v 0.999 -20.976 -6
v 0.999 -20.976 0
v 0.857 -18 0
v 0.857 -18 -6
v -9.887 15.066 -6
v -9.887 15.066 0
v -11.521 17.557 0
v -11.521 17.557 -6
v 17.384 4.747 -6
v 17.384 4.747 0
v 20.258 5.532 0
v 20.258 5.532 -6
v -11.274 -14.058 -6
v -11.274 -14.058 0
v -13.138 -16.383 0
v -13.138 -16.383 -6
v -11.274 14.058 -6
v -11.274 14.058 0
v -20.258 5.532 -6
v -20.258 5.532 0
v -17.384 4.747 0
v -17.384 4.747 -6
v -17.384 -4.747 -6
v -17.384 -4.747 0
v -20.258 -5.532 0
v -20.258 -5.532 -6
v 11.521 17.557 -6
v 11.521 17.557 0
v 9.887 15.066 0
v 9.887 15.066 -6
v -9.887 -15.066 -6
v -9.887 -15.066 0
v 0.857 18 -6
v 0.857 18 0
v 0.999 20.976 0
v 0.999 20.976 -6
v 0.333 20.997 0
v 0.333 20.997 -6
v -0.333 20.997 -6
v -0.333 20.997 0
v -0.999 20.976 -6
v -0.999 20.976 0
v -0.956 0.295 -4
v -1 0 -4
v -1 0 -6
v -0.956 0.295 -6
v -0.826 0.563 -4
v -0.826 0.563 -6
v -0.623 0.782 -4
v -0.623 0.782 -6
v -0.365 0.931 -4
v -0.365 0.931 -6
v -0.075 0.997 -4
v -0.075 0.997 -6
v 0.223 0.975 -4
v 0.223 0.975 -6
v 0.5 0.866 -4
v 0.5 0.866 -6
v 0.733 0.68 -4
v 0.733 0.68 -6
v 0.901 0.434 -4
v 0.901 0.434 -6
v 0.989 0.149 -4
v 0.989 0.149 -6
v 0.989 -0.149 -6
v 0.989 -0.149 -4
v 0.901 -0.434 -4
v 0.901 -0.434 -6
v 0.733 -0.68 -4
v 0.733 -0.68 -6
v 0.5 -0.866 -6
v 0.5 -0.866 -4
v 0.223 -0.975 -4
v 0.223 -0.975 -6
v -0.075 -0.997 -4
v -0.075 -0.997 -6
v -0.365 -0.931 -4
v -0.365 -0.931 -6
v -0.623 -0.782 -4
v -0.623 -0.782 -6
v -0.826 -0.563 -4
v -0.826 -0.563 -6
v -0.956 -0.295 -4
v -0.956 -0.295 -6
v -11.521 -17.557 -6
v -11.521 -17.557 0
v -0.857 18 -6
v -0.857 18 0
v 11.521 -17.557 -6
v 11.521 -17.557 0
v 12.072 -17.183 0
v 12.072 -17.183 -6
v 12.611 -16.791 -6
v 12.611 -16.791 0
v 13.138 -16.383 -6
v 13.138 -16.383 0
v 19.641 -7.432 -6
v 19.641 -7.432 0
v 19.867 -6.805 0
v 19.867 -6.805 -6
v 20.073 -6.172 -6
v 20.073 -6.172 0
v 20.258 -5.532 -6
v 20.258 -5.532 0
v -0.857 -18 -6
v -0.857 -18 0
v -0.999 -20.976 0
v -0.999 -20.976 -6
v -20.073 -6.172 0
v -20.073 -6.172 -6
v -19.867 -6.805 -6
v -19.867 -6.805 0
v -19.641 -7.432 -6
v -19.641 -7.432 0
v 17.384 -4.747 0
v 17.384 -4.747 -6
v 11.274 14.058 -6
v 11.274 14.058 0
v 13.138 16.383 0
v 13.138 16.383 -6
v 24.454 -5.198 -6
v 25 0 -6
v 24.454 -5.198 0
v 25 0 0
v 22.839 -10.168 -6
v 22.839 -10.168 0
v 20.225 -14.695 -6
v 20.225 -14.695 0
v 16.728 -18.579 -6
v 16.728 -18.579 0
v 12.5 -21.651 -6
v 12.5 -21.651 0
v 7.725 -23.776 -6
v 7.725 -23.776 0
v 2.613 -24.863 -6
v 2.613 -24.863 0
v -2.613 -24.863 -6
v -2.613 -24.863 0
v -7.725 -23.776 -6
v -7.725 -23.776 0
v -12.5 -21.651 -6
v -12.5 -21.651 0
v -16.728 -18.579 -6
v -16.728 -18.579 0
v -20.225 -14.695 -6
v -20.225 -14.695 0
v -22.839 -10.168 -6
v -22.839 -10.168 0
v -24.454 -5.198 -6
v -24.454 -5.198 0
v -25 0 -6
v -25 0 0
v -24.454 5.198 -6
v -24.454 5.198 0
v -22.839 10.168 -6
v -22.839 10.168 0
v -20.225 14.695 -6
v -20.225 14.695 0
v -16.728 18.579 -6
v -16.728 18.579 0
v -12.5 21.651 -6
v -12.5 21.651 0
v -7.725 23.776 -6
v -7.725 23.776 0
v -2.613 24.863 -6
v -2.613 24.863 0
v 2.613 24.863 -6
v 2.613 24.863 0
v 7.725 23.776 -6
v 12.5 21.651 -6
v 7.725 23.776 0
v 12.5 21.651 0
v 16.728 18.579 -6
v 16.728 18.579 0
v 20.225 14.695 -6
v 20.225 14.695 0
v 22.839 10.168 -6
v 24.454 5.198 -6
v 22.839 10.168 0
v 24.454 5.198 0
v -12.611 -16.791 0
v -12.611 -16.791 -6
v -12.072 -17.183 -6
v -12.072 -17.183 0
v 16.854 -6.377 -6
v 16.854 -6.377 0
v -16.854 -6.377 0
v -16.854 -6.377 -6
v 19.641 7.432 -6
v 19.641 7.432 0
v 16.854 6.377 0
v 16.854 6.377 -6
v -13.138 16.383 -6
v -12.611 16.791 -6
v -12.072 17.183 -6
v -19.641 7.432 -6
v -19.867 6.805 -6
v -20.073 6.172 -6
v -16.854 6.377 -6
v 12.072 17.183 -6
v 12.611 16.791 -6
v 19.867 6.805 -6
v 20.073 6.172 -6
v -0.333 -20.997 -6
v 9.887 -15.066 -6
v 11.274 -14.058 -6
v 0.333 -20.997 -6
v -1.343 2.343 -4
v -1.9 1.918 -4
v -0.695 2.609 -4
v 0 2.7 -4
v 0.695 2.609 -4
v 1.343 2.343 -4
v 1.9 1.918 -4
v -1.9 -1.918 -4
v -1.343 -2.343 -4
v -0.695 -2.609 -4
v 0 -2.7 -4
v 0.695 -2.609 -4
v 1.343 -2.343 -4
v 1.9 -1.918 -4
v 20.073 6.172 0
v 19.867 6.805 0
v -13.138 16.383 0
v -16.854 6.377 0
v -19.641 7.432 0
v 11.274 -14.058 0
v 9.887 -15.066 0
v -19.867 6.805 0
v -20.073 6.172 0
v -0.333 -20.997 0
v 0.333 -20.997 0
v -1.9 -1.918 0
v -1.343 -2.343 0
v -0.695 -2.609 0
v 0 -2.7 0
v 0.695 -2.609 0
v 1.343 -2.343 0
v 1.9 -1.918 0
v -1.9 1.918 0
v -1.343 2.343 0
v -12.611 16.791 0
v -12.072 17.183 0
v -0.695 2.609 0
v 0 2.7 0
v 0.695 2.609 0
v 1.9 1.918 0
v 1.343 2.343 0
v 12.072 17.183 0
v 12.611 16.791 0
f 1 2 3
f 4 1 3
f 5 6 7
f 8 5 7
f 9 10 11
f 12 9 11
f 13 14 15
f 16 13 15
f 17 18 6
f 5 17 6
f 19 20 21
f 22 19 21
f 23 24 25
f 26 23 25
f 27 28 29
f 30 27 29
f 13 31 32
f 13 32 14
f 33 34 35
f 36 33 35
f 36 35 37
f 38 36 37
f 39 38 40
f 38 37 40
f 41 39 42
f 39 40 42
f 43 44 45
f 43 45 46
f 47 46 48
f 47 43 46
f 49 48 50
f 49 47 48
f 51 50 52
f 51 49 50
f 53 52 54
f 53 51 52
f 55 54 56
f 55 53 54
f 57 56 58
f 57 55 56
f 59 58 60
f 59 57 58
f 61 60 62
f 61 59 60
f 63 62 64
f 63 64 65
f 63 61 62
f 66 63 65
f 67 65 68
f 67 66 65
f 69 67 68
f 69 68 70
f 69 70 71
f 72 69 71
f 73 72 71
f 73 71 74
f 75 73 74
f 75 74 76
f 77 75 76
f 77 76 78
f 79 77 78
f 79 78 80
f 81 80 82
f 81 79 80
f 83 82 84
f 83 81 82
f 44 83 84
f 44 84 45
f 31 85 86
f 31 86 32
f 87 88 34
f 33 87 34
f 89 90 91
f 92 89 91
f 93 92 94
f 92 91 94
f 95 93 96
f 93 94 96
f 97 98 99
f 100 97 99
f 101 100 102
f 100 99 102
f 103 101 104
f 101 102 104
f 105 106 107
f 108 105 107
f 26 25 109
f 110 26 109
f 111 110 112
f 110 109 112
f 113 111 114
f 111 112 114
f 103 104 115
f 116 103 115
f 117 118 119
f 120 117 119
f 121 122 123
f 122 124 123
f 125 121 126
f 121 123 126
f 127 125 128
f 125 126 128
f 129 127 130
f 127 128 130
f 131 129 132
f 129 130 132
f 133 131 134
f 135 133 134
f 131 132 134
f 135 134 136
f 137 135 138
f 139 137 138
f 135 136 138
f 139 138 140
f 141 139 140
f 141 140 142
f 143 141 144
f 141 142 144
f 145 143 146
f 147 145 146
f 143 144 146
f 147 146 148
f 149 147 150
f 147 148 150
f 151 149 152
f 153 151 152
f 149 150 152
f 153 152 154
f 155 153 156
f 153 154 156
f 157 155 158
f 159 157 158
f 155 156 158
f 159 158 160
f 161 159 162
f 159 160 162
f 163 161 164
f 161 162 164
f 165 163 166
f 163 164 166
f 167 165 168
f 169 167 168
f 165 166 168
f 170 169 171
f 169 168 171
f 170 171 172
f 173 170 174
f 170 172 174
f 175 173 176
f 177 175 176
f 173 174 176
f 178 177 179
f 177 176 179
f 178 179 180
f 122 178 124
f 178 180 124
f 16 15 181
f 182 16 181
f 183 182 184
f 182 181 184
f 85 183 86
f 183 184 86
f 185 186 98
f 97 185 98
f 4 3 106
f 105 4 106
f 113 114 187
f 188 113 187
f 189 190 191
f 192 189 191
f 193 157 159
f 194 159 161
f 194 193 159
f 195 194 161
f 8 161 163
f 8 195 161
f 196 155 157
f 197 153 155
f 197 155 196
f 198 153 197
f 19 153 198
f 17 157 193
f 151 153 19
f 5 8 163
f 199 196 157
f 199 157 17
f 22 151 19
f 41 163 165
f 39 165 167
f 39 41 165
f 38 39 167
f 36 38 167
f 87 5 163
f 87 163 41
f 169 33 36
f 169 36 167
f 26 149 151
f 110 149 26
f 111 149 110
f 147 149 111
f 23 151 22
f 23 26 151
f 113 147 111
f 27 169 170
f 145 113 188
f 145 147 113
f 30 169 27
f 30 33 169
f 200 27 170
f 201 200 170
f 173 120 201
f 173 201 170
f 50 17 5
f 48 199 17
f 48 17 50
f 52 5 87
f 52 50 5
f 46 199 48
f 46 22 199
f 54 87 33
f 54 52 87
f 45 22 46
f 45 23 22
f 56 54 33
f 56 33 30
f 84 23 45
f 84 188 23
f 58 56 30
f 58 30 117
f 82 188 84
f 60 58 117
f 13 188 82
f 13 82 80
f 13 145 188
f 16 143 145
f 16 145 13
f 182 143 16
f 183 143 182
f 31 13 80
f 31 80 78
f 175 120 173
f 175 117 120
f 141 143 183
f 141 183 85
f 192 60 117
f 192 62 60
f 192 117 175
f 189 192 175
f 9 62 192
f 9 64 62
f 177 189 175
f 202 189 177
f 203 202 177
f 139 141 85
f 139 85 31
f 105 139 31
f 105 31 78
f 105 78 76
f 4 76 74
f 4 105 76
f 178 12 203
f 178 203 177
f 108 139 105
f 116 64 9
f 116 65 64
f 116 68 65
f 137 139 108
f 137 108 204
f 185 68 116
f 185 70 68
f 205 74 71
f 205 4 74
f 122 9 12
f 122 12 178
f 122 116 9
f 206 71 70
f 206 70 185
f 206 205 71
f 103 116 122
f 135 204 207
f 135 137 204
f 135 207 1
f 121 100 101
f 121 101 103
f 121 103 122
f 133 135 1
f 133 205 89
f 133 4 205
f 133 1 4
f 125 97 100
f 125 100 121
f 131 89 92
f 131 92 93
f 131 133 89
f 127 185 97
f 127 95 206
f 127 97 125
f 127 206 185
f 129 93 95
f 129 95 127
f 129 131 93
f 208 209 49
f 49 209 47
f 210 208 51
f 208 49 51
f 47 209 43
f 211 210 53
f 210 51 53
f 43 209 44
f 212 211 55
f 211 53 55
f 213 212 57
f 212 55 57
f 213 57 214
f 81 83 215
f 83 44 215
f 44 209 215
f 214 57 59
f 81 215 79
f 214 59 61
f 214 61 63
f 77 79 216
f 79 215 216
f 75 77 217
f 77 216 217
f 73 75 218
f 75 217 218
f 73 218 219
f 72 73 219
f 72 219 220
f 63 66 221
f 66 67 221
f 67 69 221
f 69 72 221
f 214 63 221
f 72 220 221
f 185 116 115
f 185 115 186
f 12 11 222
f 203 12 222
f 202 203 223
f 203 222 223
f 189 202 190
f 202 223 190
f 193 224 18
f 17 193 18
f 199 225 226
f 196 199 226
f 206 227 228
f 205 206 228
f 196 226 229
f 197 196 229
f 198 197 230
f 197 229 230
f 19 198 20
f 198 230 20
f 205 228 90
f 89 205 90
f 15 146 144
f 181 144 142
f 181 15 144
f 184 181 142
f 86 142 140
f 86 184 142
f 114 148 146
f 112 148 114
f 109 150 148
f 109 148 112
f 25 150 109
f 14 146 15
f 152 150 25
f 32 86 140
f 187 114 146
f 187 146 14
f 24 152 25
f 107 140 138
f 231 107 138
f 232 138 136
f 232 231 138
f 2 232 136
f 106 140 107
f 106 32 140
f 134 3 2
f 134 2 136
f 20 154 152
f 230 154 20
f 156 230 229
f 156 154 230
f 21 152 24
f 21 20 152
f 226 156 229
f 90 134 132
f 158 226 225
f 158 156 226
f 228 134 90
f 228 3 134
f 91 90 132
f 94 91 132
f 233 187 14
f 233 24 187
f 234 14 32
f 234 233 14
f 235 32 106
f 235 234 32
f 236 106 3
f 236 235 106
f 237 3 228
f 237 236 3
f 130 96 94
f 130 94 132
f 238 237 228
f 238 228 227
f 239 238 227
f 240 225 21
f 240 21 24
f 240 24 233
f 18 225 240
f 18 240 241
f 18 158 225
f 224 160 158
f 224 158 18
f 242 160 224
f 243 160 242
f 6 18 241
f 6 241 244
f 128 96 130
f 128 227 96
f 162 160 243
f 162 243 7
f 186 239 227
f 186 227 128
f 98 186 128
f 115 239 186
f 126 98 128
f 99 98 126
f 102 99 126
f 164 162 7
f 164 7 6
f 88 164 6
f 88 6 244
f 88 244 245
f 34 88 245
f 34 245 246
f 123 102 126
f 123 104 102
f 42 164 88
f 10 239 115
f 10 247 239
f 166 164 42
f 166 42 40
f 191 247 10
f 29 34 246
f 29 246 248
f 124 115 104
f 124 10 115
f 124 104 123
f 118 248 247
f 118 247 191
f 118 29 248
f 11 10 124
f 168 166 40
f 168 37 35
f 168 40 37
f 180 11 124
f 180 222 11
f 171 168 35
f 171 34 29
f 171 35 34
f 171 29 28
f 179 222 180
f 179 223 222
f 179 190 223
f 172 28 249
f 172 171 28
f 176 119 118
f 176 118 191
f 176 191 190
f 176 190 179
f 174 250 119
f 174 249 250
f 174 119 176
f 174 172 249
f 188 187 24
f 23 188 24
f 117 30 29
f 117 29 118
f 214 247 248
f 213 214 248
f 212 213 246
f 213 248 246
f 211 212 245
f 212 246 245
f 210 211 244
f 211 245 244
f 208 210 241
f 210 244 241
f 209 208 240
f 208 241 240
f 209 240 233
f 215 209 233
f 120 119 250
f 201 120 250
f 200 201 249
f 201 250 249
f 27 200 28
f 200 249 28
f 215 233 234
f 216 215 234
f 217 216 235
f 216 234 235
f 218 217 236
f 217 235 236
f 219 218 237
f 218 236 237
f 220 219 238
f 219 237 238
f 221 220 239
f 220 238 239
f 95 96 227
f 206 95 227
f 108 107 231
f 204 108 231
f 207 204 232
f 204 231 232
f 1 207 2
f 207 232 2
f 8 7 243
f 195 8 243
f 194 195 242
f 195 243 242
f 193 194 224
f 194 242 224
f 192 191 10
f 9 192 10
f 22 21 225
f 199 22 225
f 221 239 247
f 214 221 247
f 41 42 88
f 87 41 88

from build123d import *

# Parameters (mm, degrees)
SKETCH2_R           = 25
BOSS_EXTRUDE1_DEPTH = 4
SKETCH3_R           = 25
SKETCH3_R_2         = 1
BOSS_EXTRUDE2_DEPTH = 2
CUT_EXTRUDE1_DEPTH  = 36.860842154
CIRPATTERN1_COUNT   = 10


with BuildPart() as part:
    # Sketch2 → Boss-Extrude1 (new body)
    with BuildSketch(Plane.XY):
        Circle(SKETCH2_R)
        with BuildLine():
            Line((1.9, -1.918332609), (1.9, 1.918332609))
            ThreePointArc((1.9, 1.918332609), (0, 2.7), (-1.9, 1.918332609))
            Line((-1.9, 1.918332609), (-1.9, -1.918332609))
            ThreePointArc((-1.9, -1.918332609), (0, -2.7), (1.9, -1.918332609))
        make_face(mode=Mode.SUBTRACT)
    extrude(amount=-BOSS_EXTRUDE1_DEPTH)

    # Sketch3 → Boss-Extrude2 (add)
    with BuildSketch(Plane(origin=(0, 0, -4), x_dir=(-1, 0, 0), z_dir=(0, 0, -1))):
        with Locations(Location((0, 0, 0), (0, 0, 180))):
            Circle(SKETCH3_R)
        Circle(SKETCH3_R_2, mode=Mode.SUBTRACT)
    extrude(amount=BOSS_EXTRUDE2_DEPTH)

    # Sketch4 → Cut-Extrude1 (cut, symmetric)
    with BuildSketch(Plane.XY):
        with BuildLine():
            Line((-0.857142857, 18), (0.857142857, 18))
            Line((0.857142857, 18), (0.998868138, 20.976230892))
            ThreePointArc((0.998868138, 20.976230892), (0, 21), (-0.998868138, 20.976230892))
            Line((-0.998868138, 20.976230892), (-0.857142857, 18))
        make_face()
    cut_extrude1 = extrude(amount=CUT_EXTRUDE1_DEPTH, both=True, mode=Mode.SUBTRACT)

    # CirPattern1: Cut-Extrude1 ×10 about axis
    cirpattern1_axis = Axis((0, 0, 0), (0, 0, 1))
    for i in range(1, CIRPATTERN1_COUNT):
        add(cut_extrude1.rotate(cirpattern1_axis, i * 360 / CIRPATTERN1_COUNT), mode=Mode.SUBTRACT)


solid = part.part
